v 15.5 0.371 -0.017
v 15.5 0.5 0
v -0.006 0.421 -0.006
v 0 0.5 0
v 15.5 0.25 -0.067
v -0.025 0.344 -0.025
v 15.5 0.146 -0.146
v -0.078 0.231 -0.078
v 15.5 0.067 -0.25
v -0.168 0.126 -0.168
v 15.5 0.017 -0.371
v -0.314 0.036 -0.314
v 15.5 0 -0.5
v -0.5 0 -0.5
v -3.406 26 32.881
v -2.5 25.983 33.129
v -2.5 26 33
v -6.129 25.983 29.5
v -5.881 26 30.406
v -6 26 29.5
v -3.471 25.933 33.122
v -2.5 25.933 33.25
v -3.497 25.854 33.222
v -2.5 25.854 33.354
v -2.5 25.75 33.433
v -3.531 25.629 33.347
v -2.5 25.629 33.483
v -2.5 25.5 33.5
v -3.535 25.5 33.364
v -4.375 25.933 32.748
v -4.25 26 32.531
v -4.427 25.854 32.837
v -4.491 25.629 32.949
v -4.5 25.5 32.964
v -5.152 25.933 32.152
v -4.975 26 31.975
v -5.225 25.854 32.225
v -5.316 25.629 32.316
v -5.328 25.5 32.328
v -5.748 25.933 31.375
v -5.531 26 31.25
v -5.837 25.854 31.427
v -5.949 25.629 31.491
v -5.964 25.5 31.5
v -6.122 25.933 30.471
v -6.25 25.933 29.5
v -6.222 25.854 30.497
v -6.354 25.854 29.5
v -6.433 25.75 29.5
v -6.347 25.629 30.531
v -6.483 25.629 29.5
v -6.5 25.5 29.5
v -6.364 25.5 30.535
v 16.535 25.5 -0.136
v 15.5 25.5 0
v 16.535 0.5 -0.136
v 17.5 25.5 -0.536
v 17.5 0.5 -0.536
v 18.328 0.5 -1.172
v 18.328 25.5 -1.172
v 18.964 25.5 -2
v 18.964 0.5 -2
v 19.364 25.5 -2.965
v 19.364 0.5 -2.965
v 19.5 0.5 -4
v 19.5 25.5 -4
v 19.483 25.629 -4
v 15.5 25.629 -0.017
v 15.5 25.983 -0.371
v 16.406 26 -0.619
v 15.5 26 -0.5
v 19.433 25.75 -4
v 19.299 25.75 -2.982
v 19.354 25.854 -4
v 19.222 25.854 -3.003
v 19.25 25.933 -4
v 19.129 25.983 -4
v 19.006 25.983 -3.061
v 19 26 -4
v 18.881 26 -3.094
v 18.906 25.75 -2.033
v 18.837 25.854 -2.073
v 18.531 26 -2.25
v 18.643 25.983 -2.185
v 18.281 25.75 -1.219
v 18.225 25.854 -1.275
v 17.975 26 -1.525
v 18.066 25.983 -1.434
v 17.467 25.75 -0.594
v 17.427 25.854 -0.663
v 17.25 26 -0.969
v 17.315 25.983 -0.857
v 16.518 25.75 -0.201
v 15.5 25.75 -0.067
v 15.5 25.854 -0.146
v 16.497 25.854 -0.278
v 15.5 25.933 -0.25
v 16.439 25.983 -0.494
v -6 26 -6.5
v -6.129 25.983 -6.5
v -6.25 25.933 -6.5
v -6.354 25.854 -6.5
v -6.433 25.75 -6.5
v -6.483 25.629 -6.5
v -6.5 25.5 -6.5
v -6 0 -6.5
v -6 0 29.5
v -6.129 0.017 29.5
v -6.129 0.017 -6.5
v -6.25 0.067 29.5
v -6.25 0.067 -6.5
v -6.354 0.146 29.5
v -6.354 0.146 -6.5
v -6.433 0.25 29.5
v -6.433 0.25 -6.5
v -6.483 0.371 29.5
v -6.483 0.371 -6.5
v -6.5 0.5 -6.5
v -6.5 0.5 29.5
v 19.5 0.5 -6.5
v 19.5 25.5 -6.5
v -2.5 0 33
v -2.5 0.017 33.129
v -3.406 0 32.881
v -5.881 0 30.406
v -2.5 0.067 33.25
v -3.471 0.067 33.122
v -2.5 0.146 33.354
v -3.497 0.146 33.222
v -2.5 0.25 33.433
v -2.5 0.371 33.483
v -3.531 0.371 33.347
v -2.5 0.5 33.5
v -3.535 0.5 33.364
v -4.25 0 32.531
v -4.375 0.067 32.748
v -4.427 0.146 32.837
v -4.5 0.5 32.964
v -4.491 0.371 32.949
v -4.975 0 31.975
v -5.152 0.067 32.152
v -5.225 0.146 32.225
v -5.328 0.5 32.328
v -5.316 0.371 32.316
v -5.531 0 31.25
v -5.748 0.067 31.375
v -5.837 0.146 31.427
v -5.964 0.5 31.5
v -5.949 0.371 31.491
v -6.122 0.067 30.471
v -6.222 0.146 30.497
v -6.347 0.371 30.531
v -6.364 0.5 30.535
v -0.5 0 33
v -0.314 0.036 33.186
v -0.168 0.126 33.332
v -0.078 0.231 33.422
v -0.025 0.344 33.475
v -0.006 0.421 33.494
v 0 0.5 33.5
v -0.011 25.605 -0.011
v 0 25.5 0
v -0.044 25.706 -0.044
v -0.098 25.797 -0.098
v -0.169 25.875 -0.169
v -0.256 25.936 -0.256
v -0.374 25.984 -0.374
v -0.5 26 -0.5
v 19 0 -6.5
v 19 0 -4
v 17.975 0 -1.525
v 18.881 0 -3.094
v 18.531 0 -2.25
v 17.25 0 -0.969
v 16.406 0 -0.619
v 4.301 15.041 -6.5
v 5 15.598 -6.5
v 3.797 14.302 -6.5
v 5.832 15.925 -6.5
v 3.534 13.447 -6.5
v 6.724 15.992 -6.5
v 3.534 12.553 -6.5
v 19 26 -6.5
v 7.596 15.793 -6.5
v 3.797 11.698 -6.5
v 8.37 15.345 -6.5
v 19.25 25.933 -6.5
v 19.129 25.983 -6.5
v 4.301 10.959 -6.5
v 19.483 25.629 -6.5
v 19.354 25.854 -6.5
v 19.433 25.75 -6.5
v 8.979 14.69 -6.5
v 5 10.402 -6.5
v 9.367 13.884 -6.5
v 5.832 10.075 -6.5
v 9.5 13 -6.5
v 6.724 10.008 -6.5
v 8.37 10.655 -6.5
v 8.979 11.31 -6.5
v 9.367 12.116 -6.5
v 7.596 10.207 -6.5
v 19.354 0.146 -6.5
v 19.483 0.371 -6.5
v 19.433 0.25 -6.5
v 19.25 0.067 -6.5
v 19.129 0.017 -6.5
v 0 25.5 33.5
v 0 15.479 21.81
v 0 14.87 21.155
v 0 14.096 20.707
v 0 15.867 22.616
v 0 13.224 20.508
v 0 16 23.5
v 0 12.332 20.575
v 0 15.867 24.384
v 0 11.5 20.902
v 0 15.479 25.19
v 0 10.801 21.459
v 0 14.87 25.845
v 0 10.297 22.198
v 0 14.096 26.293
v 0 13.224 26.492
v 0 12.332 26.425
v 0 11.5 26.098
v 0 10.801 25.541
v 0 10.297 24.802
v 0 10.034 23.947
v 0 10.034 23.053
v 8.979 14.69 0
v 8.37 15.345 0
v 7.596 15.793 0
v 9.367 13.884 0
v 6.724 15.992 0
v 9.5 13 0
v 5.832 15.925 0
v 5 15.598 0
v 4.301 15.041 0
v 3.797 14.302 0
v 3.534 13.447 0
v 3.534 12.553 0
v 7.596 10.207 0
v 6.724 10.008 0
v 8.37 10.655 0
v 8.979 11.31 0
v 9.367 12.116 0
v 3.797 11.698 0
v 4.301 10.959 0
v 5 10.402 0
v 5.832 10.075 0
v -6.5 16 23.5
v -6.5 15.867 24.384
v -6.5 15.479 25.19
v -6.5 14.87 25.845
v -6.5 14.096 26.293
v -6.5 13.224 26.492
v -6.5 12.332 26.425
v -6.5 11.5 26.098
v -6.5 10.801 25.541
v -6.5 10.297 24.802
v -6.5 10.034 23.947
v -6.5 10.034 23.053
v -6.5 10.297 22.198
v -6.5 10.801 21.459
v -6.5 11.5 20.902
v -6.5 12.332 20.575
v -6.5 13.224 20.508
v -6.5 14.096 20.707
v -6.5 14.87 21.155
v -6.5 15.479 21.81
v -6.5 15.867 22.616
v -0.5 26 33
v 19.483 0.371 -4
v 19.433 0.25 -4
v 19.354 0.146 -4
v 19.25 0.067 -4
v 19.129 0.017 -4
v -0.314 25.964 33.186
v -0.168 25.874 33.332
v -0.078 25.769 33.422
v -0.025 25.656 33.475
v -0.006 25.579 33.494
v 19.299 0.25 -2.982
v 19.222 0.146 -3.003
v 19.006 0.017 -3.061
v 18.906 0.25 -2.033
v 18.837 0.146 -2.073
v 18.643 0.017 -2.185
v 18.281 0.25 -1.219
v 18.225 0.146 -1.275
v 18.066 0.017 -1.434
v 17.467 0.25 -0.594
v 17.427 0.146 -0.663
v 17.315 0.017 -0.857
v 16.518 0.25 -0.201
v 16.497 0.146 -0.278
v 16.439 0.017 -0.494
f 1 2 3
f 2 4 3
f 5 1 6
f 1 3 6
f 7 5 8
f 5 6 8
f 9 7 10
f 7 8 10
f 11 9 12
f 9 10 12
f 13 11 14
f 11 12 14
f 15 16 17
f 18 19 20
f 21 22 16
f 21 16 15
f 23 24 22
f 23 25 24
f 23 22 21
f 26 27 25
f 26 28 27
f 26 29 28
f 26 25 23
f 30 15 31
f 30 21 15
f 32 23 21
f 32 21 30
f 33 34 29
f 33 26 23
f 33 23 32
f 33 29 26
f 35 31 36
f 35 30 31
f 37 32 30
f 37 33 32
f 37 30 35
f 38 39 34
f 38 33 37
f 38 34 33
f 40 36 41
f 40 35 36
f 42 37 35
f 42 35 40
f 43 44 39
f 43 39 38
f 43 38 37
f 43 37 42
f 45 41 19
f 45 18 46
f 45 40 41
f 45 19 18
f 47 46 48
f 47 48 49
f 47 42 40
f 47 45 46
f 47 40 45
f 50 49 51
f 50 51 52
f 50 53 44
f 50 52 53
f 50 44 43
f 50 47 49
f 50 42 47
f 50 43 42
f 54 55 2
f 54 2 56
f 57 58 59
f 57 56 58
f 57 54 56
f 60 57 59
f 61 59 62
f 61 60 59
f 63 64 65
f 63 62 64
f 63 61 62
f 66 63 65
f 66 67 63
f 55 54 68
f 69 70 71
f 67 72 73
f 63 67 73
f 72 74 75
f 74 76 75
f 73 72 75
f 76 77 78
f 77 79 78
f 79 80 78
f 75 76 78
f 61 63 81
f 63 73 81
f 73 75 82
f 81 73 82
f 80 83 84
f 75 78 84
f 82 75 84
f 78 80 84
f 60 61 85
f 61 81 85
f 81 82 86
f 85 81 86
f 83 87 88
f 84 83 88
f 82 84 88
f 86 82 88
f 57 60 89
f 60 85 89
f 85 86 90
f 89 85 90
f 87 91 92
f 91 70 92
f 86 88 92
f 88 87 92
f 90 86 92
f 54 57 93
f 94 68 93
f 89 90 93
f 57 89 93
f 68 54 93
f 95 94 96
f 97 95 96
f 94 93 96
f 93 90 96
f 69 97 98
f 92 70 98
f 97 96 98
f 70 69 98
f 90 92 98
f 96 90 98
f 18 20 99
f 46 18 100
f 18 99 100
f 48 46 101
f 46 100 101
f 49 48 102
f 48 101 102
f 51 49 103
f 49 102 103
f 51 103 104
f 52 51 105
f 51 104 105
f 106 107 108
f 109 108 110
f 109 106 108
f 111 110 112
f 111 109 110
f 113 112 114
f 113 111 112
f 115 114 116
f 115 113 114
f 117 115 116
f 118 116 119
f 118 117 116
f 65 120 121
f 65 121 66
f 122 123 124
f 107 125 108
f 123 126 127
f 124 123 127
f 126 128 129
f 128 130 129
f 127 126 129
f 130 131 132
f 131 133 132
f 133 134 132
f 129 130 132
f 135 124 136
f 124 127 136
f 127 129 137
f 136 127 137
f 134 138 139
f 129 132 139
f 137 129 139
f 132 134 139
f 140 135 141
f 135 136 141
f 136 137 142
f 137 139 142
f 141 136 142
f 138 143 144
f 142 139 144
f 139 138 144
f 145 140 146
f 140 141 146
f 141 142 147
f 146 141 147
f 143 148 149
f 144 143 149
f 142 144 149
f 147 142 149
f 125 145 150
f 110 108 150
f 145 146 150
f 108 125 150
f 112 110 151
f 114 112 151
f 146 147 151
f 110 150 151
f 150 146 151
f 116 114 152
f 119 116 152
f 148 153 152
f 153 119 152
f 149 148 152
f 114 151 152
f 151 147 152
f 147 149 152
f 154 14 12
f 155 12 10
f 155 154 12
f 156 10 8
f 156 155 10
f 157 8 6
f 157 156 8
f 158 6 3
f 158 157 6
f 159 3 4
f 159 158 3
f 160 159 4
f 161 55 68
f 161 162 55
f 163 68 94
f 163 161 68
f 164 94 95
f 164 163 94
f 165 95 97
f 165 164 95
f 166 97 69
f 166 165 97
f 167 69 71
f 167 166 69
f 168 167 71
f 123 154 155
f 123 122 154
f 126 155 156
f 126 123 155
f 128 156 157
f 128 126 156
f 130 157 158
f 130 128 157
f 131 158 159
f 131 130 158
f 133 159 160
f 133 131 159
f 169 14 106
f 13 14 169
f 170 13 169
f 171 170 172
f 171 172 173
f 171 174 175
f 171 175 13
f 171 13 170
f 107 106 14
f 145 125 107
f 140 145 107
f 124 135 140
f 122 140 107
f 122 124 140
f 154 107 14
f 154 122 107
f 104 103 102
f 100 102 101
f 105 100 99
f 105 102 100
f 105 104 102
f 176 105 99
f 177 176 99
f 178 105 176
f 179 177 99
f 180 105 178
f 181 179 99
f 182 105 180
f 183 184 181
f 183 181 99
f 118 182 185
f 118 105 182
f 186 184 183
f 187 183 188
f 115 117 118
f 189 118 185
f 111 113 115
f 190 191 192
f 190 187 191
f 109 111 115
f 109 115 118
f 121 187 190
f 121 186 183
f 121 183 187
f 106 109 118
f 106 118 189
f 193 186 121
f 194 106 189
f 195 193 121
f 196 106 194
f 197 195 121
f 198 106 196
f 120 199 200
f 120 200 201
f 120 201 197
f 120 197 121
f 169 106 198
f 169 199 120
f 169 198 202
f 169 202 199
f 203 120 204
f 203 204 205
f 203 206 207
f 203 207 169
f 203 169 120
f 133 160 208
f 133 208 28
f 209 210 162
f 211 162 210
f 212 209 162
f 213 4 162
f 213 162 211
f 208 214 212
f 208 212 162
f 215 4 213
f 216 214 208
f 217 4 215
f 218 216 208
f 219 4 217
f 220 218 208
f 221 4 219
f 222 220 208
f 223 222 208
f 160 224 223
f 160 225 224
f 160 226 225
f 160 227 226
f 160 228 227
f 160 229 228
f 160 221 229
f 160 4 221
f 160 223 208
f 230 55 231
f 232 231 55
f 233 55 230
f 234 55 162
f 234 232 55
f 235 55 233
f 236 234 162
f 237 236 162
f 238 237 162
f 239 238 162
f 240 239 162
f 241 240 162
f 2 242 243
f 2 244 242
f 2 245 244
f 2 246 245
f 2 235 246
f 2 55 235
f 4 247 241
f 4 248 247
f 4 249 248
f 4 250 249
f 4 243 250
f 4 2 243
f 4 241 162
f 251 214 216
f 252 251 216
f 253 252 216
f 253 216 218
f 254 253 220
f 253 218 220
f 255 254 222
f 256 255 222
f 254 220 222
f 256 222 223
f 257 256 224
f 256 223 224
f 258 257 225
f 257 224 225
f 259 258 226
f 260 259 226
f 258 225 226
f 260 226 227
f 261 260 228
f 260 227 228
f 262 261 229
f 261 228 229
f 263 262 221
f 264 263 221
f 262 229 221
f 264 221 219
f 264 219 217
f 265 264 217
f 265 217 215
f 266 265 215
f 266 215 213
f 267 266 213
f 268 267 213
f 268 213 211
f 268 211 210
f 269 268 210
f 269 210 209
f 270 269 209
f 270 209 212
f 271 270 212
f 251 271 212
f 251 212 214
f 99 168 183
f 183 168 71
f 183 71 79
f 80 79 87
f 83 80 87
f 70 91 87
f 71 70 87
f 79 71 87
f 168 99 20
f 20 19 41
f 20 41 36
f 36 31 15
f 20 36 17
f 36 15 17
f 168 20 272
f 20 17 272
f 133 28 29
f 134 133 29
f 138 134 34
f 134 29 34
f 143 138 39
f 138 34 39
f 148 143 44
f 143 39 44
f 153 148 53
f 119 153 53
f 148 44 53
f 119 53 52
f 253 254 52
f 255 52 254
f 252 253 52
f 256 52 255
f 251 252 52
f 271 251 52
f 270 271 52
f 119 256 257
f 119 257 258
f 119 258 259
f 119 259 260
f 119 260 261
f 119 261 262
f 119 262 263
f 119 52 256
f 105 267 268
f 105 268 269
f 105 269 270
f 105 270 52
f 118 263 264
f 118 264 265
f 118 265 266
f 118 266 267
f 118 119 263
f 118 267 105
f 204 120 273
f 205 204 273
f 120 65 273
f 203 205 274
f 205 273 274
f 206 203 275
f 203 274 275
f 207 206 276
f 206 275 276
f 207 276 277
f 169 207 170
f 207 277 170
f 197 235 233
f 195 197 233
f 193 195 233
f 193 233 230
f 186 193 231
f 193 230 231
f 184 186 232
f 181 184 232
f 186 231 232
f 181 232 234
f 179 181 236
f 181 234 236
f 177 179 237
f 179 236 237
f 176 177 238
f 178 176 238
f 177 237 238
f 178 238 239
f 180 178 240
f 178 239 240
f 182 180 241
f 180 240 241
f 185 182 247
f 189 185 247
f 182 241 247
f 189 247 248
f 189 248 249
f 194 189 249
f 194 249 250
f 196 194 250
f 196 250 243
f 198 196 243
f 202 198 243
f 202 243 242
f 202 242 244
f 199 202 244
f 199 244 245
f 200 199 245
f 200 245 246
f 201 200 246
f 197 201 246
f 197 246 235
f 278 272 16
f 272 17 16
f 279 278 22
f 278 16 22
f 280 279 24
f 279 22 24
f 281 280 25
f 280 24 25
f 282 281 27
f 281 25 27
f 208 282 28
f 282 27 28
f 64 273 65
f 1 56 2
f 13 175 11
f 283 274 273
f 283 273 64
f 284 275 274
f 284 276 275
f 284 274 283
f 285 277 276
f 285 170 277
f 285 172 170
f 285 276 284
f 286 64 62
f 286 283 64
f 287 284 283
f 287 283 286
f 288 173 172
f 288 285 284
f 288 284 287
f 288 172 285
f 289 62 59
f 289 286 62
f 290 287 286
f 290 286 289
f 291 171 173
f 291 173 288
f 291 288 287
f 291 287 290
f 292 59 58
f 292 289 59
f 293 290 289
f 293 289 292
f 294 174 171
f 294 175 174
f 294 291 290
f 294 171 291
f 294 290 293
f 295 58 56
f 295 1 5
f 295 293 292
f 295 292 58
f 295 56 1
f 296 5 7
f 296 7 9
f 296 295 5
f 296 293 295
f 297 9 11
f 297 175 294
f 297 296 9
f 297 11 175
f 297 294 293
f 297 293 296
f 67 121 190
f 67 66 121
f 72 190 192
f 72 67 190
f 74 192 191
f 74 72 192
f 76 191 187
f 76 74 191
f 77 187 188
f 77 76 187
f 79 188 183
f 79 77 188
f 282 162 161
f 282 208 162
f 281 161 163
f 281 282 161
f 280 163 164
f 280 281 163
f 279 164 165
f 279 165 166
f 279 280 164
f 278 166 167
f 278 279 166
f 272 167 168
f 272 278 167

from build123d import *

# Parameters (mm, degrees)
F1_DEPTH = 26
F2_R     = 3
F3_DEPTH = 25
F4_R     = 3
F5_DEPTH = 25
F6_R     = 4
F7_R     = 0.5


with BuildPart() as f1:
    # F0 (on Front) → F1 (new body)
    with BuildSketch(Plane.XZ):
        Polygon((0, 0), (0, 33.5), (-6.5, 33.5), (-6.5, -6.5), (19.5, -6.5), (19.5, 0), align=None)
    extrude(amount=-F1_DEPTH)

    # F2 (on Right) → F3 (cut)
    with BuildSketch(Plane.YZ):
        with Locations((13, 23.5)):
            Circle(F2_R)
    extrude(amount=-F3_DEPTH, mode=Mode.SUBTRACT)

    # F4 (on Top) → F5 (cut)
    with BuildSketch(Plane.XY):
        with Locations((6.5, 13)):
            Circle(F4_R)
    extrude(amount=-F5_DEPTH, mode=Mode.SUBTRACT)

    # F6
    f6_edges = [f1.edges().sort_by_distance(p)[0] for p in [
        (-6.5, 13, 33.5),
        (19.5, 13, 0),
    ]]
    fillet(f6_edges, radius=F6_R)

    # F7
    f7_edges = [f1.edges().sort_by_distance(p)[0] for p in [
        (-6.5, 0, 11.5),
        (-6.5, 26, 11.5),
        (7.75, 26, 0),
        (0, 26, 16.75),
        (0, 0, 16.75),
        (7.75, 0, 0),
    ]]
    fillet(f7_edges, radius=F7_R)


solid = f1.part
